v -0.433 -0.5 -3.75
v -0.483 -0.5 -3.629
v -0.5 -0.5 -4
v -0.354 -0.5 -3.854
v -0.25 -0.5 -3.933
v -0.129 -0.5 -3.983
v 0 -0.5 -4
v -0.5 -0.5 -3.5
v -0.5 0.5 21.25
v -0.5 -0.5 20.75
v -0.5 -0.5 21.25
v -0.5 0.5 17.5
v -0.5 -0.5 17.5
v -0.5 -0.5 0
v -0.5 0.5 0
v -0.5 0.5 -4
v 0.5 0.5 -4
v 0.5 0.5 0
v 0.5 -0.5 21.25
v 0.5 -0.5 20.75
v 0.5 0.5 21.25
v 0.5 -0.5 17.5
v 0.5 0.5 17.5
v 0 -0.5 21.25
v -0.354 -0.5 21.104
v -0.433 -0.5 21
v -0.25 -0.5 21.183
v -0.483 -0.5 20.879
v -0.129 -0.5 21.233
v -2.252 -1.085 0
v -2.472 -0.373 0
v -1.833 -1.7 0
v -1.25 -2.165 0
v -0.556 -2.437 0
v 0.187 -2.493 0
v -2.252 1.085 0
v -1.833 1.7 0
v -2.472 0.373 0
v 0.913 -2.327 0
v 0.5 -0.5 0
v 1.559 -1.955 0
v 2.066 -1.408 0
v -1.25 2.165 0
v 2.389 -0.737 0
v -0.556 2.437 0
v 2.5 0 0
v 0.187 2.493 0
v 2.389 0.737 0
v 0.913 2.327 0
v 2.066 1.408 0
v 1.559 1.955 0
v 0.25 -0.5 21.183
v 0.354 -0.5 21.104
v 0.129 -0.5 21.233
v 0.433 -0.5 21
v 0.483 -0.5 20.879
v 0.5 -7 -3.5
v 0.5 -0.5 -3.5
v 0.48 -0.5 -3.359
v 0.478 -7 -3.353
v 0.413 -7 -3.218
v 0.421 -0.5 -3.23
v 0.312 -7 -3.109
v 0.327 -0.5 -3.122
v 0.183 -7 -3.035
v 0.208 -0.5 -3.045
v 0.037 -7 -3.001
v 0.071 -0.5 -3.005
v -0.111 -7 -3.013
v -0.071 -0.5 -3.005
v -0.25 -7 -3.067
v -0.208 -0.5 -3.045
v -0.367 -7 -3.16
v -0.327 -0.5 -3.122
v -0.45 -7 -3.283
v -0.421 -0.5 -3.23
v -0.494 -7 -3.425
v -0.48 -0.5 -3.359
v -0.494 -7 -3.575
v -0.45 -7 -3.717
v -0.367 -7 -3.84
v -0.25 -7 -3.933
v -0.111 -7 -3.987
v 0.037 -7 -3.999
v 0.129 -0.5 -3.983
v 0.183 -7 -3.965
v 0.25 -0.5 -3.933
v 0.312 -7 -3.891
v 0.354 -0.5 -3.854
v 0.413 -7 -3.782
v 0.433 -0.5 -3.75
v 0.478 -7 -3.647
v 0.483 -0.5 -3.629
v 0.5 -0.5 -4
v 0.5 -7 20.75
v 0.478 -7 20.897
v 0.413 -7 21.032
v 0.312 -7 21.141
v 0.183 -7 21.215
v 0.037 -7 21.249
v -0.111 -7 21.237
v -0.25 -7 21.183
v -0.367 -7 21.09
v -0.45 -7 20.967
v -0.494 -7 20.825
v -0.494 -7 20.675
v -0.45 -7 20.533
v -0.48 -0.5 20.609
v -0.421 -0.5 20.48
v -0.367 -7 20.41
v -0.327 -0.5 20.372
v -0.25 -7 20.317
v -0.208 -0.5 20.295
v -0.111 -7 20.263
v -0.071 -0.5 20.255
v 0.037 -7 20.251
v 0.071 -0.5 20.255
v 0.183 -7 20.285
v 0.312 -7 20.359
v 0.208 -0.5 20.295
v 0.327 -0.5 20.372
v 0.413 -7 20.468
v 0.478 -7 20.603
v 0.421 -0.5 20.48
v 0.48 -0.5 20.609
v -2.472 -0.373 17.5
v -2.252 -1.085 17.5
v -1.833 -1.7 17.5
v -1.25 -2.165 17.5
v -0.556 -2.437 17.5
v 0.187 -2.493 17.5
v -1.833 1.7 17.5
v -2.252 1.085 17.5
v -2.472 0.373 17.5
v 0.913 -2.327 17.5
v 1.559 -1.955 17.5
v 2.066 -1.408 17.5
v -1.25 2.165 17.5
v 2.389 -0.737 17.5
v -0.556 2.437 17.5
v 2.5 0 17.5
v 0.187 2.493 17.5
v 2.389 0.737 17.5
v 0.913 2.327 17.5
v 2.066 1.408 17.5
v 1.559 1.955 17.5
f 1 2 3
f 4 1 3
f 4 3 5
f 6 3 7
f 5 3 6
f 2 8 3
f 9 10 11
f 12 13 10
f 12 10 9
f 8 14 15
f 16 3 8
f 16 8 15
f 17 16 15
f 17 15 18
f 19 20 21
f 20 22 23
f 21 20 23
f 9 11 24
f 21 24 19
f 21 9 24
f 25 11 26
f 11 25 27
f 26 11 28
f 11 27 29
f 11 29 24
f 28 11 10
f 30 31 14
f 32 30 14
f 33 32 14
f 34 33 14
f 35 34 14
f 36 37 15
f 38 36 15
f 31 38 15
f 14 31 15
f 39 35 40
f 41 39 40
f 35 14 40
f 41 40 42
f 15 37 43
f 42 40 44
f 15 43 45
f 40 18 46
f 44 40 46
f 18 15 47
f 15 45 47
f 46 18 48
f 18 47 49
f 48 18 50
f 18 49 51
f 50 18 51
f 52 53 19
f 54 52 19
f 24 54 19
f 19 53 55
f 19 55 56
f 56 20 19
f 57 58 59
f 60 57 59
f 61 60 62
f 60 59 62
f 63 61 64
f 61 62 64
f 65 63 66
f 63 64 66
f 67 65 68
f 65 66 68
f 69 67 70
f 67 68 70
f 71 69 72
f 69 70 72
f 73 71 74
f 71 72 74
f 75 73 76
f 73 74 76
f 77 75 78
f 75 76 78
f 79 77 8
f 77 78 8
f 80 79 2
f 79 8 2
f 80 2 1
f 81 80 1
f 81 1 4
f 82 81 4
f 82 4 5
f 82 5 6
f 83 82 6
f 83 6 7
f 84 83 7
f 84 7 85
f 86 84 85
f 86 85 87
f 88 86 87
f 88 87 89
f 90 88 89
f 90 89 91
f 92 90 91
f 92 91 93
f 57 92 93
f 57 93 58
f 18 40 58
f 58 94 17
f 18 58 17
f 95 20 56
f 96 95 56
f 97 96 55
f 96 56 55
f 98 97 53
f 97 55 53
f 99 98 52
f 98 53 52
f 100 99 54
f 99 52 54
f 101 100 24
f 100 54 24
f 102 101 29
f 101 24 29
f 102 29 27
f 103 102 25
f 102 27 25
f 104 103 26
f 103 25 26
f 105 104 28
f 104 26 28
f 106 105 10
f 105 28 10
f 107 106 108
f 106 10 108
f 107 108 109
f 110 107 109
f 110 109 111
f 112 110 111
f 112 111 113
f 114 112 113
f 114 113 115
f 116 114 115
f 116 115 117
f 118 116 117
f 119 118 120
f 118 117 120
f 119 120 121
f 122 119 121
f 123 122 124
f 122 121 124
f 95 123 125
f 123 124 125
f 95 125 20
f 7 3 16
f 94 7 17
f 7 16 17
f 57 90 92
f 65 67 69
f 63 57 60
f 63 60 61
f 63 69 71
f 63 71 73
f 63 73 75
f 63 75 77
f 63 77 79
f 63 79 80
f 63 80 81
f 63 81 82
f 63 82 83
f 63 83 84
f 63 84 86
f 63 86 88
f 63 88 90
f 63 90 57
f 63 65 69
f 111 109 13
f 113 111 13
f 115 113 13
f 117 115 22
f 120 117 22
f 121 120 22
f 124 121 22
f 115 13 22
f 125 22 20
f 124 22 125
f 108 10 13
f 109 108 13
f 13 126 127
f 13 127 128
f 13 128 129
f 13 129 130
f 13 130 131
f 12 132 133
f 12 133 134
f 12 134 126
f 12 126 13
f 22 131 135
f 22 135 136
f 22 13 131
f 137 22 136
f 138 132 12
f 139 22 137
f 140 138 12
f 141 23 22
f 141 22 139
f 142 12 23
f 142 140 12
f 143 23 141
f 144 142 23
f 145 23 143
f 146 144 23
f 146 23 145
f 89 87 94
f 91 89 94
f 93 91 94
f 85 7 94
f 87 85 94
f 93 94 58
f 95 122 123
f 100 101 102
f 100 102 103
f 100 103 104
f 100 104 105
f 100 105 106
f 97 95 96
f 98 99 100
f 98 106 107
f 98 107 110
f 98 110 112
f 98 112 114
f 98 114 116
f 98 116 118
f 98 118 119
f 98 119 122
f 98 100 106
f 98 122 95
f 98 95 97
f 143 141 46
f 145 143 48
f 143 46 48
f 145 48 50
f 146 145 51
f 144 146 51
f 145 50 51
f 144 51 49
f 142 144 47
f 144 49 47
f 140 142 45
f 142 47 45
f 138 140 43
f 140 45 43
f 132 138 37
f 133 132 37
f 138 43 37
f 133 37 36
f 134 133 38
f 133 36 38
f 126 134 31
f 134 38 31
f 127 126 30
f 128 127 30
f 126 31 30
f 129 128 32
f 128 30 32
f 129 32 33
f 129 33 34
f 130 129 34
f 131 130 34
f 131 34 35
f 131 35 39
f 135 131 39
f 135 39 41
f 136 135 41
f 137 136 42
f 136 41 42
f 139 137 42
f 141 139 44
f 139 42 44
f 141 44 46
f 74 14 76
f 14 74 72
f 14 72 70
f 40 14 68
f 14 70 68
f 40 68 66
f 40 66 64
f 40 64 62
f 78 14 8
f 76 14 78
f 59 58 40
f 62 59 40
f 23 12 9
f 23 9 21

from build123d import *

# Parameters (mm, degrees)
SKETCH_1_R           = 2.5
EXTRUDE_1_DEPTH      = 17.5
EXTRUDE_2_DEPTH      = 3.75
EXTRUDE_2_DEPTH_BACK = 21.5
SKETCH_2_W           = 1
SKETCH_2_H           = 1
SKETCH_3_R           = 0.5
EXTRUDE_3_DEPTH      = 6.5


with BuildPart() as part:
    # Эскиз1 → Вытянуть1 (new body)
    with BuildSketch(Plane.XY):
        Circle(SKETCH_1_R)
    extrude(amount=EXTRUDE_1_DEPTH)

    # Эскиз2 → Вытянуть2 (add, two sides: drawn at the far end of the back side and taken through both)
    with BuildSketch(Plane.XY.offset(17.5).offset(-EXTRUDE_2_DEPTH_BACK)):
        Rectangle(SKETCH_2_W, SKETCH_2_H)
    extrude(amount=EXTRUDE_2_DEPTH + EXTRUDE_2_DEPTH_BACK)

    # Эскиз3 → Вытянуть3 (add)
    with BuildSketch(Plane.XZ.offset(0.5)):
        with Locations((0, 20.75)):
            Circle(SKETCH_3_R)
        with Locations((0, -3.5)):
            Circle(SKETCH_3_R)
    extrude(amount=EXTRUDE_3_DEPTH)


solid = part.part
